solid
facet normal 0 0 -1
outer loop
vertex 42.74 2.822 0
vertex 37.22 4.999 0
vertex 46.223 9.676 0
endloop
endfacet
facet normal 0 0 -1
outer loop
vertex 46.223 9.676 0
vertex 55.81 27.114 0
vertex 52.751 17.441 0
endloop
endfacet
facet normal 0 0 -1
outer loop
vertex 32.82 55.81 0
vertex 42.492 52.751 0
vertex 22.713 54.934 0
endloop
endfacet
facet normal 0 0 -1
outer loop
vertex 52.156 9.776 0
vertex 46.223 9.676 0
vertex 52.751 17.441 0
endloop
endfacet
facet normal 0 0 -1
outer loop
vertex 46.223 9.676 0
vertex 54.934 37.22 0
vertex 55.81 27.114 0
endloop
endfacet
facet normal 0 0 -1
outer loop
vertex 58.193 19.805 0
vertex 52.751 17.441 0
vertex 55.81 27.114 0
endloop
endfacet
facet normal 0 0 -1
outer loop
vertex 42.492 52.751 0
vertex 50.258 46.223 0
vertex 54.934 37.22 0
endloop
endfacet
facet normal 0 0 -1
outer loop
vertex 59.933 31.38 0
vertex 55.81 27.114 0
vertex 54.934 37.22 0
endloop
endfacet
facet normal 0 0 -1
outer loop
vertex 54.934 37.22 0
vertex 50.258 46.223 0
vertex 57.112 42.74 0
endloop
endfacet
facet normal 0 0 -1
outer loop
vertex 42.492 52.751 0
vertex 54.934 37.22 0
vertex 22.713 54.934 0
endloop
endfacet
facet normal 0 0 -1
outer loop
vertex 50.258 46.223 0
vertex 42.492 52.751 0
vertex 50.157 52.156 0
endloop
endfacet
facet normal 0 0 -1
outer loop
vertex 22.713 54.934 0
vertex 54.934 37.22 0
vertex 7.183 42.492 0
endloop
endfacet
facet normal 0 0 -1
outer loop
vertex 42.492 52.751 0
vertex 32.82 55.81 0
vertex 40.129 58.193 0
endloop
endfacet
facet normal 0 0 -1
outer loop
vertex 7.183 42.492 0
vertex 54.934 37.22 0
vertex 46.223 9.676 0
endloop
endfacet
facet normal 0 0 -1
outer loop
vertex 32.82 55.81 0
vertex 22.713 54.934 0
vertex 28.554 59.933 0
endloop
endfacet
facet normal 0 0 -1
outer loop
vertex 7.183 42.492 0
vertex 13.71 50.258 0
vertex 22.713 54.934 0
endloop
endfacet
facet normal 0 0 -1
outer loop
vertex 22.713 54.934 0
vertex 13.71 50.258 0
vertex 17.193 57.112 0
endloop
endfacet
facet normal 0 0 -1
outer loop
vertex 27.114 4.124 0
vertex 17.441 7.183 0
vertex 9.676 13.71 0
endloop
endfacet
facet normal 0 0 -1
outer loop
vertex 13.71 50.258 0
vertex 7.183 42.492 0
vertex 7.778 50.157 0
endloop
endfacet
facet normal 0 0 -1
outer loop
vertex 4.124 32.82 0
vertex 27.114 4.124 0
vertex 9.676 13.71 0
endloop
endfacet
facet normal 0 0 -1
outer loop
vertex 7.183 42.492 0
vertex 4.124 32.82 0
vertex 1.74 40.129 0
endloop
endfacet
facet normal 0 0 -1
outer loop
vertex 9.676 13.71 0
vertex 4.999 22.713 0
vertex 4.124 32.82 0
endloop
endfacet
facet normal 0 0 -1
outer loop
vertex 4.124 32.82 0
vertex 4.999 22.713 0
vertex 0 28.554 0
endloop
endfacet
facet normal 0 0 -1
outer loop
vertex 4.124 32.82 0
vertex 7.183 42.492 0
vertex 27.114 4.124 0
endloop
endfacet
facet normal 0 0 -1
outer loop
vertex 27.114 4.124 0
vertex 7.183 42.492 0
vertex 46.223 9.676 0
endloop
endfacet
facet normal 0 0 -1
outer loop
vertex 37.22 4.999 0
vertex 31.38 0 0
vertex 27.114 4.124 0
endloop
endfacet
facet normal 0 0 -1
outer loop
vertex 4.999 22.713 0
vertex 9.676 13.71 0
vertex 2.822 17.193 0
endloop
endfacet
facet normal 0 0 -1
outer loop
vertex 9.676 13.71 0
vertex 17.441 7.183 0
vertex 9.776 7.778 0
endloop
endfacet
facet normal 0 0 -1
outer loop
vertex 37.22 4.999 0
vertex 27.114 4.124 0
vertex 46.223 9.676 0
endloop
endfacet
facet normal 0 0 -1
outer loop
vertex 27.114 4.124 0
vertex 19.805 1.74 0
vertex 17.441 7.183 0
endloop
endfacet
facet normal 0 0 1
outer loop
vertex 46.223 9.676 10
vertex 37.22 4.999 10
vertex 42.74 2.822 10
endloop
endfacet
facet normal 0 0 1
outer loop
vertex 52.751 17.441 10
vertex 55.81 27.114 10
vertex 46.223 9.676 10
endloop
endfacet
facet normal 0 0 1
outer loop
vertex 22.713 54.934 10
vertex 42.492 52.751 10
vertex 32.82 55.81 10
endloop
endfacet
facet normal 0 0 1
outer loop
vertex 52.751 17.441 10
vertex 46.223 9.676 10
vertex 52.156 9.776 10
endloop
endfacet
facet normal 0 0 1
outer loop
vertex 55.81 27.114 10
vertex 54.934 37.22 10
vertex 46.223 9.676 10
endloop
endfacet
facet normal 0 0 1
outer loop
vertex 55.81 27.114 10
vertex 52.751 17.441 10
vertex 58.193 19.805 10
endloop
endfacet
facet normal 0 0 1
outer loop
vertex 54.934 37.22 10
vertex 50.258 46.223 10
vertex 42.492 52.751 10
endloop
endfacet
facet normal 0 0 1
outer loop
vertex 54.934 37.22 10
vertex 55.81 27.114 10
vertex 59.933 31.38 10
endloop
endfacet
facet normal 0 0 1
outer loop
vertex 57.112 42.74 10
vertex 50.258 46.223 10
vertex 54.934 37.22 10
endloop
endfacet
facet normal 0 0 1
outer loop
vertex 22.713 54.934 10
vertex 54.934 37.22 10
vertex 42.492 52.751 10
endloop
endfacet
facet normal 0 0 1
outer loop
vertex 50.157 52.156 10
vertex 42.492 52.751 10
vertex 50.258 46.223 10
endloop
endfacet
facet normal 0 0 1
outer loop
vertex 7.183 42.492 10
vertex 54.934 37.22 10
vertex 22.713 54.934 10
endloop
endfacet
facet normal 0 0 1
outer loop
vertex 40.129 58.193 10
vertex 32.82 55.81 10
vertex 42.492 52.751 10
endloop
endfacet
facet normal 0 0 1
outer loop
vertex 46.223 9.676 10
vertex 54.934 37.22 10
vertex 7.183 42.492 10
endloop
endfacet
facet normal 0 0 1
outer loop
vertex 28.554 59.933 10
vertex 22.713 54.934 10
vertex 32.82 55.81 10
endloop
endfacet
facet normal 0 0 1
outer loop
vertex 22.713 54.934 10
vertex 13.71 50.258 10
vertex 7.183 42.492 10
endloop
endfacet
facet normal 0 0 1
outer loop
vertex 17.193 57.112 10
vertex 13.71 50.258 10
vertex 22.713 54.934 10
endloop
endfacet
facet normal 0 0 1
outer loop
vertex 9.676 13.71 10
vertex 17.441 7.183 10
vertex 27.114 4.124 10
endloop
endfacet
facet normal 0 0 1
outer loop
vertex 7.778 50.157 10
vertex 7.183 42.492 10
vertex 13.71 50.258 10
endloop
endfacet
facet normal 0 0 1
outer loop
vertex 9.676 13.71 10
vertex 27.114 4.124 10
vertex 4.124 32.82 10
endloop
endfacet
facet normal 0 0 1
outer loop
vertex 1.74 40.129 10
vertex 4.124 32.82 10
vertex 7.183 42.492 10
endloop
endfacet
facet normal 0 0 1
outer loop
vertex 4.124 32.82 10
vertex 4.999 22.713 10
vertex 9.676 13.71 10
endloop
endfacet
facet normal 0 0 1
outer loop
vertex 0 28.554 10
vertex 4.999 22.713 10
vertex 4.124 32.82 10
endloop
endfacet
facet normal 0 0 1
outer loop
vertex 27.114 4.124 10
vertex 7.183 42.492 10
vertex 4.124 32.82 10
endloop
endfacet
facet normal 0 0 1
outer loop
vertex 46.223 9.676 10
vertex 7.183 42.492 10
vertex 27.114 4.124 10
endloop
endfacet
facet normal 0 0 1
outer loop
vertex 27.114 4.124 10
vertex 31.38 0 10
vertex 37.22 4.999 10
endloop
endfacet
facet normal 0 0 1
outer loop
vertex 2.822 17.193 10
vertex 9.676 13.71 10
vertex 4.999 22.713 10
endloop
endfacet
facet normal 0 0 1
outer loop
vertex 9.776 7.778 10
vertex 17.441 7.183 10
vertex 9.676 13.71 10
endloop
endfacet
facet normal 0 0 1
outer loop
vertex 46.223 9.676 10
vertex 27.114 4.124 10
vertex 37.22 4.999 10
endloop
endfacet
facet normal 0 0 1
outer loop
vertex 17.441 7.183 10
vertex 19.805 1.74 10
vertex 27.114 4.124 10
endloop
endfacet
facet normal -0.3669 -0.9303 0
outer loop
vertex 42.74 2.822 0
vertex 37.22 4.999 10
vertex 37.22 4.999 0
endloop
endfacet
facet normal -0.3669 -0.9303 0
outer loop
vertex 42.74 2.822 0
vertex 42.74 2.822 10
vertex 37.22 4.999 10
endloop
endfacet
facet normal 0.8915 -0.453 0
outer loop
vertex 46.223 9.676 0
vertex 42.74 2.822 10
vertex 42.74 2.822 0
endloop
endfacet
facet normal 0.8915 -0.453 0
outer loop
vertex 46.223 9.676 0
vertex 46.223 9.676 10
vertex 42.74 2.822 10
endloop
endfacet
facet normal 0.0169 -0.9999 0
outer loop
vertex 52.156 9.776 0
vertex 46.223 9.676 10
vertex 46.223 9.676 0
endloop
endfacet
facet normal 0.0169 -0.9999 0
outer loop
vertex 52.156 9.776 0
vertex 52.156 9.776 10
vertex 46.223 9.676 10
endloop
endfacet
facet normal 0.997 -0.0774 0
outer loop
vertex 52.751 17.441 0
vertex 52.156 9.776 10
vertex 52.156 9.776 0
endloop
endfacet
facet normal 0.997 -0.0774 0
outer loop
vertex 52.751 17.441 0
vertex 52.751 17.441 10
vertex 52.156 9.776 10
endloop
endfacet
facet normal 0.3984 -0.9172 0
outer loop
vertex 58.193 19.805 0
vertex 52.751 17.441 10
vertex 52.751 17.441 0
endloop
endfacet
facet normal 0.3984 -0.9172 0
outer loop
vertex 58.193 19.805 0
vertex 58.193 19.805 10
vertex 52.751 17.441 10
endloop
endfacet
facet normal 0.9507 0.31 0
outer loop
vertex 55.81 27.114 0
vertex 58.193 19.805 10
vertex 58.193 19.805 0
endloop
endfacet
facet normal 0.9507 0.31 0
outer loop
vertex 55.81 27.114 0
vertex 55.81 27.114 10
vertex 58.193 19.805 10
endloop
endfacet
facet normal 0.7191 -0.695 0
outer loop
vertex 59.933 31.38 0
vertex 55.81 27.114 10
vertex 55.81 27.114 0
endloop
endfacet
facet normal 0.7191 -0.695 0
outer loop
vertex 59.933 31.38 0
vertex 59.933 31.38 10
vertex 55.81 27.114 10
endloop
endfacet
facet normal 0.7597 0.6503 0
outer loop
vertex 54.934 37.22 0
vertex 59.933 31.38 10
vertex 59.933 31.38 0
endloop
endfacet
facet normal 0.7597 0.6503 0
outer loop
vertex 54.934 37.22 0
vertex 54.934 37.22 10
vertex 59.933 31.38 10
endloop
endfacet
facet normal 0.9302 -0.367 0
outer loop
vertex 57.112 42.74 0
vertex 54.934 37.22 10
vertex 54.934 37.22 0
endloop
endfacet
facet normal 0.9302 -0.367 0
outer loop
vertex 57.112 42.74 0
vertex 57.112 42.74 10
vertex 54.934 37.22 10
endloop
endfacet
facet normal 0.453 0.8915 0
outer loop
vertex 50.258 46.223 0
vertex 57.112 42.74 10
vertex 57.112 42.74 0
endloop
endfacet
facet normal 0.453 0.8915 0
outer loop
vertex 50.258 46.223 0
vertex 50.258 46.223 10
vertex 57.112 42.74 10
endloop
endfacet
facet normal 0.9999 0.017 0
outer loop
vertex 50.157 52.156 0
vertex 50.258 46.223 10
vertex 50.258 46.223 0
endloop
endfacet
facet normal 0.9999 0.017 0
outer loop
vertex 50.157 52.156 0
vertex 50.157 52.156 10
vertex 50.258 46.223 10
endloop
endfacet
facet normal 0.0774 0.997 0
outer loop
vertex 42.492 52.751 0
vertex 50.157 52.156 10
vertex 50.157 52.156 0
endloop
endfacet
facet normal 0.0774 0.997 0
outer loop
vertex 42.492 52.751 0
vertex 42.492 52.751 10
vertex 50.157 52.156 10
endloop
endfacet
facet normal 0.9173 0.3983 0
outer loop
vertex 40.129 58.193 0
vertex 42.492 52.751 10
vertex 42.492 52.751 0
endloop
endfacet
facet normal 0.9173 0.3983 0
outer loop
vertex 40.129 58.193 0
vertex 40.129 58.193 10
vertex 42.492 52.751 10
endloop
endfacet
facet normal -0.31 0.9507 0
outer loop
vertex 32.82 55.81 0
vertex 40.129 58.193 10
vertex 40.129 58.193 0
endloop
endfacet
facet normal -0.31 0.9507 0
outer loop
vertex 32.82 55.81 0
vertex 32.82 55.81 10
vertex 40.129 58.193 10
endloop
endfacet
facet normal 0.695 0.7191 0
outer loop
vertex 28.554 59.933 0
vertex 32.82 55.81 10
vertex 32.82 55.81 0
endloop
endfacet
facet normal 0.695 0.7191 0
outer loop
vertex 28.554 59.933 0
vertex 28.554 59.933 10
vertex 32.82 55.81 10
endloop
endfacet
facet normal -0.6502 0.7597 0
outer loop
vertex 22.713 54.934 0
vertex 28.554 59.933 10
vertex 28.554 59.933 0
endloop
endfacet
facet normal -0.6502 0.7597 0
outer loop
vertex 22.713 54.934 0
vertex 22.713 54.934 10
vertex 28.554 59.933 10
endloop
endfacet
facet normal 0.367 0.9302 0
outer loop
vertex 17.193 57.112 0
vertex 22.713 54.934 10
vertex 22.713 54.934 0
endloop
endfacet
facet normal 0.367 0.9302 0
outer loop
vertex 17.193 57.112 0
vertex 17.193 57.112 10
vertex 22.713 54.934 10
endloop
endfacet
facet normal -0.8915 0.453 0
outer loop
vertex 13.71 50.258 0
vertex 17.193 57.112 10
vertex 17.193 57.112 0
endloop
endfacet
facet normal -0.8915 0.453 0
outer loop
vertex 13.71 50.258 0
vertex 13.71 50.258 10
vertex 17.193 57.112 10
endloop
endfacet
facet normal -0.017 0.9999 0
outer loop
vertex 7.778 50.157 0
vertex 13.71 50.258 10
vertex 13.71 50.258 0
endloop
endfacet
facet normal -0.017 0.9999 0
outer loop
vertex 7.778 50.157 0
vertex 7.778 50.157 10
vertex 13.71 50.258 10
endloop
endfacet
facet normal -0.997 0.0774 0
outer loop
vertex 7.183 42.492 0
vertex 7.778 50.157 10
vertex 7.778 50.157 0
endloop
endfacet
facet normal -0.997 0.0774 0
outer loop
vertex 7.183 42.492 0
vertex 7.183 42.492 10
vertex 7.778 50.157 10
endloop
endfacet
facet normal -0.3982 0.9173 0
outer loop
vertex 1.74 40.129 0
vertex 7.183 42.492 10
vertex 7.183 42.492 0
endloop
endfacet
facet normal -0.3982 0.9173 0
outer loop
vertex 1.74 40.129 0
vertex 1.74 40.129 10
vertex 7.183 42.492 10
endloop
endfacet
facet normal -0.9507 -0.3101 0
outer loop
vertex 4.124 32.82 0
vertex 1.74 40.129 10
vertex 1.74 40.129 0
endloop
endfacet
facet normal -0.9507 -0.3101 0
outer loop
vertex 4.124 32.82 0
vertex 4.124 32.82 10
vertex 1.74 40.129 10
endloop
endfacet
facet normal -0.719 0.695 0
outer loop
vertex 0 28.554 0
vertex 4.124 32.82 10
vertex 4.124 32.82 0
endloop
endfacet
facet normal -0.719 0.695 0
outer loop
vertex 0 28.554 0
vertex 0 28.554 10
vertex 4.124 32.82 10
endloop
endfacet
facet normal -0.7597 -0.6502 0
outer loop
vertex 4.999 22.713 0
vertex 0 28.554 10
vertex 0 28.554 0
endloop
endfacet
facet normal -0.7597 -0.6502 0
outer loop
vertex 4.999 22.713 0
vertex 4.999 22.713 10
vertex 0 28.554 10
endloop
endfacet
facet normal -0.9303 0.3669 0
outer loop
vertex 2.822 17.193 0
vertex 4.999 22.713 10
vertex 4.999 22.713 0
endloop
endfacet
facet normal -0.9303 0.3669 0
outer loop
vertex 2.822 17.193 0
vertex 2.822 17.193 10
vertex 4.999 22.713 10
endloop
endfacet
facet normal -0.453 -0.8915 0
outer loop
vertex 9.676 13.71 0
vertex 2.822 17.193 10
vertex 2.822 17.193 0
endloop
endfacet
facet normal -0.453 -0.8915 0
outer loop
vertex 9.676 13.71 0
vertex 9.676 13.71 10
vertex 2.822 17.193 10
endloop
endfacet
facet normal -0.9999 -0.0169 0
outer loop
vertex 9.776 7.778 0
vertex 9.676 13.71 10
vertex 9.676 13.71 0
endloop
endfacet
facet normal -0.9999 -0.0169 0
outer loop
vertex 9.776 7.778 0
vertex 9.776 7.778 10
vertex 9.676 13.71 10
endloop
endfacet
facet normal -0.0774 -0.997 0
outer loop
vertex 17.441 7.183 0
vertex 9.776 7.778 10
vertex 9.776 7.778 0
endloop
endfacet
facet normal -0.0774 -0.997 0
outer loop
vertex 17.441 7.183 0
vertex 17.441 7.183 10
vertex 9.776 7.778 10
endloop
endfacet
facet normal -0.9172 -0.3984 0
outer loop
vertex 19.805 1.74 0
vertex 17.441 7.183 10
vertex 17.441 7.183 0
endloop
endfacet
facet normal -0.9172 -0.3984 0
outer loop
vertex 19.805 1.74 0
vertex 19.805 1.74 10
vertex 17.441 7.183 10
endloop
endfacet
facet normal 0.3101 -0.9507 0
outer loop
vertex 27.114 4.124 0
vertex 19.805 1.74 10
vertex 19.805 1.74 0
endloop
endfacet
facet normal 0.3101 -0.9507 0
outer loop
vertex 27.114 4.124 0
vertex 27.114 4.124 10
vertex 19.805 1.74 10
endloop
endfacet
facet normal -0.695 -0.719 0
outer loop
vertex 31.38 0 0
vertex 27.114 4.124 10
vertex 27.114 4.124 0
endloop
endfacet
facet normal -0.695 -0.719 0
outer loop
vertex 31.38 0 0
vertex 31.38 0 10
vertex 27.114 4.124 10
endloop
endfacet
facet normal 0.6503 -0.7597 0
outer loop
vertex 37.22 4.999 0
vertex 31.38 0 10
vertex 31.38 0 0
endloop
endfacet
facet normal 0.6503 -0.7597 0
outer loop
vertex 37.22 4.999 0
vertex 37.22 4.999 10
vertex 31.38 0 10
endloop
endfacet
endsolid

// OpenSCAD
$fn = 32;

// ----------------------------------------------------------------------
// Chain sprocket: 16 teeth, 26 mm root radius
// ----------------------------------------------------------------------

// --- parameters (mm) ---
profile_height = 10;      // extrusion height
profile_points = 32;      // points of the closed outline

profile = [[55.81, 27.114], [59.933, 31.38], [54.934, 37.22], [57.112, 42.74], [50.258, 46.223], [50.157, 52.156], [42.492, 52.751], [40.129, 58.193], [32.82, 55.81], [28.554, 59.933], [22.713, 54.934], [17.193, 57.112], [13.71, 50.258], [7.778, 50.157], [7.183, 42.492], [1.74, 40.129], [4.124, 32.82], [0, 28.554], [4.999, 22.713], [2.822, 17.193], [9.676, 13.71], [9.776, 7.778], [17.441, 7.183], [19.805, 1.74], [27.114, 4.124], [31.38, 0], [37.22, 4.999], [42.74, 2.822], [46.223, 9.676], [52.156, 9.776], [52.751, 17.441], [58.193, 19.805]];  // single closed polygon, 32 points, counter clockwise

// --- the one profile operation ---
linear_extrude(height = profile_height) polygon(points = profile);
